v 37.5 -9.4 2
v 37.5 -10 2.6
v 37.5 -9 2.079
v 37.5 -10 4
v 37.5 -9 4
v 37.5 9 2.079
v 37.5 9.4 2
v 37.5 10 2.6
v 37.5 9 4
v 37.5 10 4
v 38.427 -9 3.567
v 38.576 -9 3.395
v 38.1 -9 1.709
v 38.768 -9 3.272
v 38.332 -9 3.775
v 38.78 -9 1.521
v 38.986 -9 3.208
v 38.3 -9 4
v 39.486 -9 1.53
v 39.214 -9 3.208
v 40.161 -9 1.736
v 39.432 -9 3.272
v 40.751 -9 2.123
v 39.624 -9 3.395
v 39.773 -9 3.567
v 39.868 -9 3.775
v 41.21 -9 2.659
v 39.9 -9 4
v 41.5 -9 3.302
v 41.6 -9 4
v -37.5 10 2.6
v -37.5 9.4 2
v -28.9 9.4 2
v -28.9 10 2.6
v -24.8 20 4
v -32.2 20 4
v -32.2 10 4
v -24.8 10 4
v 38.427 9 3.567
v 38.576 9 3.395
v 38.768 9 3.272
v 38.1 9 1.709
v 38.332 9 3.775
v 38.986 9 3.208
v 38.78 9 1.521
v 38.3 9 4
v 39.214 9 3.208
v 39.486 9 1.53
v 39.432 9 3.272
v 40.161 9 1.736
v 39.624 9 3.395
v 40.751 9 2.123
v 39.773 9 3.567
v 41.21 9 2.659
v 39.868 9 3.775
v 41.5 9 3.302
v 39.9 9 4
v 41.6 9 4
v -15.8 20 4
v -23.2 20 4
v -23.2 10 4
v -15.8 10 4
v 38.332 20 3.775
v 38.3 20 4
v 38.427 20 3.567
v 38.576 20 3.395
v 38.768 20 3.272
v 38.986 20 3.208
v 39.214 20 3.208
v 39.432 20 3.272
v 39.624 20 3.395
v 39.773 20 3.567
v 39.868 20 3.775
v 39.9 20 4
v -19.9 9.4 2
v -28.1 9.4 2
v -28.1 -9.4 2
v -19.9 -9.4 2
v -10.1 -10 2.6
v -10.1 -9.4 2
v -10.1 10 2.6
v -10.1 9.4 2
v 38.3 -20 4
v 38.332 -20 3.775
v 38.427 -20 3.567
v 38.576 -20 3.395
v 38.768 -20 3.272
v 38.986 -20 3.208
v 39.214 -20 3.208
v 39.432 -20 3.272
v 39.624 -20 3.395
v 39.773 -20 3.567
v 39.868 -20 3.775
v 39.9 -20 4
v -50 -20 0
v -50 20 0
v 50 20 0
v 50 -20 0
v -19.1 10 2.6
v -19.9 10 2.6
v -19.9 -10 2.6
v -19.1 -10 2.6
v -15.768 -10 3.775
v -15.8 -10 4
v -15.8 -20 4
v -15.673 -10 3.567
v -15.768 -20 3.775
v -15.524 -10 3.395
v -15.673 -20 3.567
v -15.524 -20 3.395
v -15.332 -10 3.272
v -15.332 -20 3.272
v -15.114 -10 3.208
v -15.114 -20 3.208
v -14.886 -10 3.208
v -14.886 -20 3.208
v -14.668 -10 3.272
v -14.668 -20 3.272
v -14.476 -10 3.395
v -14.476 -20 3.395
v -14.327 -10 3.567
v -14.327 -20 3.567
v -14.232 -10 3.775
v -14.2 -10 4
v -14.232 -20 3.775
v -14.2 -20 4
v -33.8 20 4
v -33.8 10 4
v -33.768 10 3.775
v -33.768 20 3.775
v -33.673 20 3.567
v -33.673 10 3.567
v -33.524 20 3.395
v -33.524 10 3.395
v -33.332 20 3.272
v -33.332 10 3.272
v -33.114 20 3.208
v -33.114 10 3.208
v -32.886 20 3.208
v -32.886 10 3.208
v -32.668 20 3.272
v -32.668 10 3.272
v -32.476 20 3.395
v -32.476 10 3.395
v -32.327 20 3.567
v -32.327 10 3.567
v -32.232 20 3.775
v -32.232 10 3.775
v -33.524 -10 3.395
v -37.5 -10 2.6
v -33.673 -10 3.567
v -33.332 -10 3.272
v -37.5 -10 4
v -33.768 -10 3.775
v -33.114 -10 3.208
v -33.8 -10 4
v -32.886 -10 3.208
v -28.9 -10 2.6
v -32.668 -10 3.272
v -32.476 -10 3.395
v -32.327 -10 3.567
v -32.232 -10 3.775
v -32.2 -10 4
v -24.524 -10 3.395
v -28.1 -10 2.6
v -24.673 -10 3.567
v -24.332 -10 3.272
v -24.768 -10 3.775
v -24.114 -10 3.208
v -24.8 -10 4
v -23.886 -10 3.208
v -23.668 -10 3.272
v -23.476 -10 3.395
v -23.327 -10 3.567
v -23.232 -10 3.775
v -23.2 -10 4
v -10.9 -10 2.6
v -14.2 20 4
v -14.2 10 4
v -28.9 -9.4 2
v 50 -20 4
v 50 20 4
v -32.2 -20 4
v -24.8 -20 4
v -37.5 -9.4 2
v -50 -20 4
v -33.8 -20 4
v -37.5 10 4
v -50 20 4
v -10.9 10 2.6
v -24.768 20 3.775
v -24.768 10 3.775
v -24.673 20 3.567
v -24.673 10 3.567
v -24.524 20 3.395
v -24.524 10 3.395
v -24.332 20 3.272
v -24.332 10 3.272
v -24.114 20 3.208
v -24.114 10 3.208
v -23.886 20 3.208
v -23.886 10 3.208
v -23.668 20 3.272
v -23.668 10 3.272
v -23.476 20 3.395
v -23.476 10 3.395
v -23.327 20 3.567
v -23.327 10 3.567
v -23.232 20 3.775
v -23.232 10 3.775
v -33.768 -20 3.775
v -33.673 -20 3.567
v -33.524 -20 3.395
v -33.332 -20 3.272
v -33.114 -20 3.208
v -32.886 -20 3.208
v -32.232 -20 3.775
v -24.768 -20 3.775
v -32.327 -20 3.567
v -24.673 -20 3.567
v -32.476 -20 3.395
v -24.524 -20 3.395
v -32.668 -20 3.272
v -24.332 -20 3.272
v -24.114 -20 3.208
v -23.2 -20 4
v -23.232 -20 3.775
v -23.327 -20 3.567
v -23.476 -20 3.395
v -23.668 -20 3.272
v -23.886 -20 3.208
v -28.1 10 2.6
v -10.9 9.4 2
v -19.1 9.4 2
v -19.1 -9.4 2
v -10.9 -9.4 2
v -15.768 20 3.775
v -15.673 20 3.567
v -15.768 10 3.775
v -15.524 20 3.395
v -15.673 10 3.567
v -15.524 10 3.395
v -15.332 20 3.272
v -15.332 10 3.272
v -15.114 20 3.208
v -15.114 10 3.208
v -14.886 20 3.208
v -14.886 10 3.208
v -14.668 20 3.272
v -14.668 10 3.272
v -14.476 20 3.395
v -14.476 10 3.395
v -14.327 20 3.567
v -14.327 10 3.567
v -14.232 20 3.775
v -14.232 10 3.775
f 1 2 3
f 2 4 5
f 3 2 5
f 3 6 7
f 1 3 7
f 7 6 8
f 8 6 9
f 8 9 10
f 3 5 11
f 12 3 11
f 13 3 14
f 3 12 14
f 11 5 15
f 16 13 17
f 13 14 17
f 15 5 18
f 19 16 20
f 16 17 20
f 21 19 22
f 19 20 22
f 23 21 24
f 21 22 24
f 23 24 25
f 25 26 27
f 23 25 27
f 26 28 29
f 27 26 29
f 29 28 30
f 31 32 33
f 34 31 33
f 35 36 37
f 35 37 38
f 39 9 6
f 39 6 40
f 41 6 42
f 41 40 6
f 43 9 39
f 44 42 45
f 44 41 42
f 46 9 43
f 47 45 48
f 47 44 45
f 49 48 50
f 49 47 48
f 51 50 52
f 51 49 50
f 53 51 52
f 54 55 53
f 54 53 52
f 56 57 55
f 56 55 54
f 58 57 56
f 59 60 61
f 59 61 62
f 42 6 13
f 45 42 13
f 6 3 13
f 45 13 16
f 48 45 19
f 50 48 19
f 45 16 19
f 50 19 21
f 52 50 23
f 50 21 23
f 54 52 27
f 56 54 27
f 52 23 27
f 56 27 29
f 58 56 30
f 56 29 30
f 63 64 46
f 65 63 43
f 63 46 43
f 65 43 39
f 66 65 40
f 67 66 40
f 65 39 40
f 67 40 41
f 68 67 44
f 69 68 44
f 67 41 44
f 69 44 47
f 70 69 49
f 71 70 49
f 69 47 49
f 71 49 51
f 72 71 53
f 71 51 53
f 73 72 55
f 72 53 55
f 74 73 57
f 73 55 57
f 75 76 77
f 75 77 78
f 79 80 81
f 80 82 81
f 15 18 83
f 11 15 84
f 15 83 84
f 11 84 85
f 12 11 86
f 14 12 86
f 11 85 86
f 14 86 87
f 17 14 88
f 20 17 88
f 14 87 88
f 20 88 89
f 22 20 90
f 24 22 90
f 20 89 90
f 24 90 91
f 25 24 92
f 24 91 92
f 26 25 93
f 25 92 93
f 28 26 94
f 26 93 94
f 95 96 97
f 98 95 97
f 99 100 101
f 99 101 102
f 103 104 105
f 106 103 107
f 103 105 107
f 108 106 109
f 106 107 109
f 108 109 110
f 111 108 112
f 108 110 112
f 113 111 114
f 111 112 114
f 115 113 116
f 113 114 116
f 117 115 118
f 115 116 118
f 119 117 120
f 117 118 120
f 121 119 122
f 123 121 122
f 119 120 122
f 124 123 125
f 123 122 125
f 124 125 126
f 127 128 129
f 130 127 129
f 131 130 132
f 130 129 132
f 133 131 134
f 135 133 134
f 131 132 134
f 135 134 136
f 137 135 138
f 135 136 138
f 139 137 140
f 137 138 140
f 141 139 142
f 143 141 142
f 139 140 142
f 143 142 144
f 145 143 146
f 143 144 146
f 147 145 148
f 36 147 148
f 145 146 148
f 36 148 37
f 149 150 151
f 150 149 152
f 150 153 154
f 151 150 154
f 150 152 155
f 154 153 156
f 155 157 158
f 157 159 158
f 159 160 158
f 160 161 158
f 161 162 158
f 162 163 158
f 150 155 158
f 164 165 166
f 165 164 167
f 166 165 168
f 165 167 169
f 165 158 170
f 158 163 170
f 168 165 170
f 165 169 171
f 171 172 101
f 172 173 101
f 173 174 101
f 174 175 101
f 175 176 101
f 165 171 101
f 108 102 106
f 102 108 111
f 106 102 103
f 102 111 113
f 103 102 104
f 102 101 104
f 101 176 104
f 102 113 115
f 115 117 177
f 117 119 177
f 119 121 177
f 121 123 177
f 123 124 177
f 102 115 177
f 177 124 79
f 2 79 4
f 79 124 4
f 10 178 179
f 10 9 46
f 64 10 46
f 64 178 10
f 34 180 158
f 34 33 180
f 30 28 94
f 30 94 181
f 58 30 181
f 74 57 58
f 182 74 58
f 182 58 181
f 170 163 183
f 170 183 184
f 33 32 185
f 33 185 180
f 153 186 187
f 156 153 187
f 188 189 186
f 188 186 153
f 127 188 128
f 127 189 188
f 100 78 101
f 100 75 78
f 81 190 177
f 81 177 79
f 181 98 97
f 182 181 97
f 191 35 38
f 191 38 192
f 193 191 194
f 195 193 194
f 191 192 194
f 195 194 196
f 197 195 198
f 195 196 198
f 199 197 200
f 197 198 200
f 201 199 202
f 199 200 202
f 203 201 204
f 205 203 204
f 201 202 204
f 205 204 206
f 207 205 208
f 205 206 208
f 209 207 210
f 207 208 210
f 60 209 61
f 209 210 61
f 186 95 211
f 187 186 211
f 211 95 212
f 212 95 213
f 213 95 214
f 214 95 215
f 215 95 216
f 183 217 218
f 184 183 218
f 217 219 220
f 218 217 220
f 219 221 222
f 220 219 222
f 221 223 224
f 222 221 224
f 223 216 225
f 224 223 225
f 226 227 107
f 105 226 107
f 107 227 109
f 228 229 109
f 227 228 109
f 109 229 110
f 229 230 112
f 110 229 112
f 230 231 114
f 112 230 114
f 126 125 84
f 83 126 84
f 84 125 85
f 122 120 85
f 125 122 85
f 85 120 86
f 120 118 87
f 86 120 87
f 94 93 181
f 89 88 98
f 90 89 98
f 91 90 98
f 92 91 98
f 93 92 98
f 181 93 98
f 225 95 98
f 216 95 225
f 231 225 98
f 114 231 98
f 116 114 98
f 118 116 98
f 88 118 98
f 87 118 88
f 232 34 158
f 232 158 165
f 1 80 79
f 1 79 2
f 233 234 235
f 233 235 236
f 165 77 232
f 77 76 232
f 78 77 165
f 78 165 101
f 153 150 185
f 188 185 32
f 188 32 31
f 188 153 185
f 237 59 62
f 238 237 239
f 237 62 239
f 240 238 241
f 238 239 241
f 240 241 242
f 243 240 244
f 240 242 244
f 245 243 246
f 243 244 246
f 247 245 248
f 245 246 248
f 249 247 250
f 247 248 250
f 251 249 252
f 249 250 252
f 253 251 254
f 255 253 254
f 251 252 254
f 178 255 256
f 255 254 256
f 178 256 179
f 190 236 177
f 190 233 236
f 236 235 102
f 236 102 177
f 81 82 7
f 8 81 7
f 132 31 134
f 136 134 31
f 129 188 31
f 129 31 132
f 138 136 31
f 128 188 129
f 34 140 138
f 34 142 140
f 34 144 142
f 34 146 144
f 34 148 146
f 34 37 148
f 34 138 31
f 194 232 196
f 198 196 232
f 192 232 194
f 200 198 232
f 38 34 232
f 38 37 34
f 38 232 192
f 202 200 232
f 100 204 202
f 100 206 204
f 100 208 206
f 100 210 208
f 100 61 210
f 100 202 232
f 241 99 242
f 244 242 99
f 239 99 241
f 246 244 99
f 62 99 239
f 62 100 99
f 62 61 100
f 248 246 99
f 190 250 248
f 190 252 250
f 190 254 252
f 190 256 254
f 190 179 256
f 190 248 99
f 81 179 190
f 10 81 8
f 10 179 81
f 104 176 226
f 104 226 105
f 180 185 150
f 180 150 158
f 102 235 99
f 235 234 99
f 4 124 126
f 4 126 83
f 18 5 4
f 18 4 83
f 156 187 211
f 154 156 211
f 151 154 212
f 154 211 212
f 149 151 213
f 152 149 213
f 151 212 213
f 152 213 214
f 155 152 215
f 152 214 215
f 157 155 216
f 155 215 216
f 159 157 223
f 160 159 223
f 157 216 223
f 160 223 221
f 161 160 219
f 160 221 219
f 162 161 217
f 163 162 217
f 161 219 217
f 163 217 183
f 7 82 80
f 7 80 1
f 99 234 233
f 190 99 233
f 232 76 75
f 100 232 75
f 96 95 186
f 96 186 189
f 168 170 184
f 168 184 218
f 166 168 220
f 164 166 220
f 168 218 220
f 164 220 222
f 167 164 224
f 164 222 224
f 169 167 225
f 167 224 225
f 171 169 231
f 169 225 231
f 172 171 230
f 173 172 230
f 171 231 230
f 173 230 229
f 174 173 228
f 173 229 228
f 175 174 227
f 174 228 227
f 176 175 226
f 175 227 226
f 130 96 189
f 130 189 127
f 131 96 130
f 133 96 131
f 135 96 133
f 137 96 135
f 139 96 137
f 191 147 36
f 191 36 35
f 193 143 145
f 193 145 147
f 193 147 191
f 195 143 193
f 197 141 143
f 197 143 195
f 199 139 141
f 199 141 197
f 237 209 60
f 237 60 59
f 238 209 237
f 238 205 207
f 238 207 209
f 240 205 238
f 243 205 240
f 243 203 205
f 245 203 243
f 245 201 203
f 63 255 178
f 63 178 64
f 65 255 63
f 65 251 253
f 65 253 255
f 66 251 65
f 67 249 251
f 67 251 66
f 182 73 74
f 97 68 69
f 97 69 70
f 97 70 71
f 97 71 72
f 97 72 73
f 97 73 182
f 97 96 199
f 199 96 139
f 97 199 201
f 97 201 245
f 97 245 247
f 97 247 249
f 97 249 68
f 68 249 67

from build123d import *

# Parameters (mm, degrees)
F0_W      = 100
F0_H      = 40
F1_DEPTH  = 4
F2_W      = 75
F2_H      = 20
F3_DEPTH  = 2
F5_R      = 2.5
F6_DEPTH  = 9
F7_DEPTH  = 40.001
F9_SIZE   = 0.6
F8_W      = 0.8
F8_H      = 20
F10_DEPTH = 0.6


with BuildPart() as f1:
    # F0 (on Top) → F1 (new body)
    with BuildSketch(Plane.XY):
        Rectangle(F0_W, F0_H)
    extrude(amount=F1_DEPTH)

    # F2 (on face) → F3 (cut)
    with BuildSketch(Plane.XY.offset(4)):
        Rectangle(F2_W, F2_H)
    extrude(amount=-F3_DEPTH, mode=Mode.SUBTRACT)

    # F5 (on Front) → F6 (cut, symmetric)
    with BuildSketch(Plane.XZ):
        with Locations((39.1, 4)):
            Circle(F5_R)
    extrude(amount=F6_DEPTH, both=True, mode=Mode.SUBTRACT)

    # F4 (on face) → F7 (cut, through all)
    with BuildSketch(Plane.XZ.offset(20)):
        with BuildLine():
            ThreePointArc((-33.8, 4), (-33, 3.2), (-32.2, 4))
            Line((-32.2, 4), (-33.8, 4))
        make_face()
        with BuildLine():
            Line((-23.2, 4), (-24.8, 4))
            ThreePointArc((-24.8, 4), (-24, 3.2), (-23.2, 4))
        make_face()
        with BuildLine():
            Line((-14.2, 4), (-15.8, 4))
            ThreePointArc((-15.8, 4), (-15, 3.2), (-14.2, 4))
        make_face()
        with BuildLine():
            Line((39.9, 4), (38.3, 4))
            ThreePointArc((38.3, 4), (39.1, 3.2), (39.9, 4))
        make_face()
    extrude(amount=-F7_DEPTH, mode=Mode.SUBTRACT)

    # F9
    f9_edges = [f1.edges().sort_by_distance(p)[0] for p in [
        (0, 10, 2),
        (0, -10, 2),
    ]]
    chamfer(f9_edges, length=F9_SIZE)

    # F8 (on face) → F10 (join)
    with BuildSketch(Plane.XY.offset(2)):
        with Locations((-28.5, 0)):
            Rectangle(F8_W, F8_H)
        with Locations((-19.5, 0)):
            Rectangle(F8_W, F8_H)
        with Locations((-10.5, 0)):
            Rectangle(F8_W, F8_H)
    extrude(amount=F10_DEPTH)


solid = f1.part
